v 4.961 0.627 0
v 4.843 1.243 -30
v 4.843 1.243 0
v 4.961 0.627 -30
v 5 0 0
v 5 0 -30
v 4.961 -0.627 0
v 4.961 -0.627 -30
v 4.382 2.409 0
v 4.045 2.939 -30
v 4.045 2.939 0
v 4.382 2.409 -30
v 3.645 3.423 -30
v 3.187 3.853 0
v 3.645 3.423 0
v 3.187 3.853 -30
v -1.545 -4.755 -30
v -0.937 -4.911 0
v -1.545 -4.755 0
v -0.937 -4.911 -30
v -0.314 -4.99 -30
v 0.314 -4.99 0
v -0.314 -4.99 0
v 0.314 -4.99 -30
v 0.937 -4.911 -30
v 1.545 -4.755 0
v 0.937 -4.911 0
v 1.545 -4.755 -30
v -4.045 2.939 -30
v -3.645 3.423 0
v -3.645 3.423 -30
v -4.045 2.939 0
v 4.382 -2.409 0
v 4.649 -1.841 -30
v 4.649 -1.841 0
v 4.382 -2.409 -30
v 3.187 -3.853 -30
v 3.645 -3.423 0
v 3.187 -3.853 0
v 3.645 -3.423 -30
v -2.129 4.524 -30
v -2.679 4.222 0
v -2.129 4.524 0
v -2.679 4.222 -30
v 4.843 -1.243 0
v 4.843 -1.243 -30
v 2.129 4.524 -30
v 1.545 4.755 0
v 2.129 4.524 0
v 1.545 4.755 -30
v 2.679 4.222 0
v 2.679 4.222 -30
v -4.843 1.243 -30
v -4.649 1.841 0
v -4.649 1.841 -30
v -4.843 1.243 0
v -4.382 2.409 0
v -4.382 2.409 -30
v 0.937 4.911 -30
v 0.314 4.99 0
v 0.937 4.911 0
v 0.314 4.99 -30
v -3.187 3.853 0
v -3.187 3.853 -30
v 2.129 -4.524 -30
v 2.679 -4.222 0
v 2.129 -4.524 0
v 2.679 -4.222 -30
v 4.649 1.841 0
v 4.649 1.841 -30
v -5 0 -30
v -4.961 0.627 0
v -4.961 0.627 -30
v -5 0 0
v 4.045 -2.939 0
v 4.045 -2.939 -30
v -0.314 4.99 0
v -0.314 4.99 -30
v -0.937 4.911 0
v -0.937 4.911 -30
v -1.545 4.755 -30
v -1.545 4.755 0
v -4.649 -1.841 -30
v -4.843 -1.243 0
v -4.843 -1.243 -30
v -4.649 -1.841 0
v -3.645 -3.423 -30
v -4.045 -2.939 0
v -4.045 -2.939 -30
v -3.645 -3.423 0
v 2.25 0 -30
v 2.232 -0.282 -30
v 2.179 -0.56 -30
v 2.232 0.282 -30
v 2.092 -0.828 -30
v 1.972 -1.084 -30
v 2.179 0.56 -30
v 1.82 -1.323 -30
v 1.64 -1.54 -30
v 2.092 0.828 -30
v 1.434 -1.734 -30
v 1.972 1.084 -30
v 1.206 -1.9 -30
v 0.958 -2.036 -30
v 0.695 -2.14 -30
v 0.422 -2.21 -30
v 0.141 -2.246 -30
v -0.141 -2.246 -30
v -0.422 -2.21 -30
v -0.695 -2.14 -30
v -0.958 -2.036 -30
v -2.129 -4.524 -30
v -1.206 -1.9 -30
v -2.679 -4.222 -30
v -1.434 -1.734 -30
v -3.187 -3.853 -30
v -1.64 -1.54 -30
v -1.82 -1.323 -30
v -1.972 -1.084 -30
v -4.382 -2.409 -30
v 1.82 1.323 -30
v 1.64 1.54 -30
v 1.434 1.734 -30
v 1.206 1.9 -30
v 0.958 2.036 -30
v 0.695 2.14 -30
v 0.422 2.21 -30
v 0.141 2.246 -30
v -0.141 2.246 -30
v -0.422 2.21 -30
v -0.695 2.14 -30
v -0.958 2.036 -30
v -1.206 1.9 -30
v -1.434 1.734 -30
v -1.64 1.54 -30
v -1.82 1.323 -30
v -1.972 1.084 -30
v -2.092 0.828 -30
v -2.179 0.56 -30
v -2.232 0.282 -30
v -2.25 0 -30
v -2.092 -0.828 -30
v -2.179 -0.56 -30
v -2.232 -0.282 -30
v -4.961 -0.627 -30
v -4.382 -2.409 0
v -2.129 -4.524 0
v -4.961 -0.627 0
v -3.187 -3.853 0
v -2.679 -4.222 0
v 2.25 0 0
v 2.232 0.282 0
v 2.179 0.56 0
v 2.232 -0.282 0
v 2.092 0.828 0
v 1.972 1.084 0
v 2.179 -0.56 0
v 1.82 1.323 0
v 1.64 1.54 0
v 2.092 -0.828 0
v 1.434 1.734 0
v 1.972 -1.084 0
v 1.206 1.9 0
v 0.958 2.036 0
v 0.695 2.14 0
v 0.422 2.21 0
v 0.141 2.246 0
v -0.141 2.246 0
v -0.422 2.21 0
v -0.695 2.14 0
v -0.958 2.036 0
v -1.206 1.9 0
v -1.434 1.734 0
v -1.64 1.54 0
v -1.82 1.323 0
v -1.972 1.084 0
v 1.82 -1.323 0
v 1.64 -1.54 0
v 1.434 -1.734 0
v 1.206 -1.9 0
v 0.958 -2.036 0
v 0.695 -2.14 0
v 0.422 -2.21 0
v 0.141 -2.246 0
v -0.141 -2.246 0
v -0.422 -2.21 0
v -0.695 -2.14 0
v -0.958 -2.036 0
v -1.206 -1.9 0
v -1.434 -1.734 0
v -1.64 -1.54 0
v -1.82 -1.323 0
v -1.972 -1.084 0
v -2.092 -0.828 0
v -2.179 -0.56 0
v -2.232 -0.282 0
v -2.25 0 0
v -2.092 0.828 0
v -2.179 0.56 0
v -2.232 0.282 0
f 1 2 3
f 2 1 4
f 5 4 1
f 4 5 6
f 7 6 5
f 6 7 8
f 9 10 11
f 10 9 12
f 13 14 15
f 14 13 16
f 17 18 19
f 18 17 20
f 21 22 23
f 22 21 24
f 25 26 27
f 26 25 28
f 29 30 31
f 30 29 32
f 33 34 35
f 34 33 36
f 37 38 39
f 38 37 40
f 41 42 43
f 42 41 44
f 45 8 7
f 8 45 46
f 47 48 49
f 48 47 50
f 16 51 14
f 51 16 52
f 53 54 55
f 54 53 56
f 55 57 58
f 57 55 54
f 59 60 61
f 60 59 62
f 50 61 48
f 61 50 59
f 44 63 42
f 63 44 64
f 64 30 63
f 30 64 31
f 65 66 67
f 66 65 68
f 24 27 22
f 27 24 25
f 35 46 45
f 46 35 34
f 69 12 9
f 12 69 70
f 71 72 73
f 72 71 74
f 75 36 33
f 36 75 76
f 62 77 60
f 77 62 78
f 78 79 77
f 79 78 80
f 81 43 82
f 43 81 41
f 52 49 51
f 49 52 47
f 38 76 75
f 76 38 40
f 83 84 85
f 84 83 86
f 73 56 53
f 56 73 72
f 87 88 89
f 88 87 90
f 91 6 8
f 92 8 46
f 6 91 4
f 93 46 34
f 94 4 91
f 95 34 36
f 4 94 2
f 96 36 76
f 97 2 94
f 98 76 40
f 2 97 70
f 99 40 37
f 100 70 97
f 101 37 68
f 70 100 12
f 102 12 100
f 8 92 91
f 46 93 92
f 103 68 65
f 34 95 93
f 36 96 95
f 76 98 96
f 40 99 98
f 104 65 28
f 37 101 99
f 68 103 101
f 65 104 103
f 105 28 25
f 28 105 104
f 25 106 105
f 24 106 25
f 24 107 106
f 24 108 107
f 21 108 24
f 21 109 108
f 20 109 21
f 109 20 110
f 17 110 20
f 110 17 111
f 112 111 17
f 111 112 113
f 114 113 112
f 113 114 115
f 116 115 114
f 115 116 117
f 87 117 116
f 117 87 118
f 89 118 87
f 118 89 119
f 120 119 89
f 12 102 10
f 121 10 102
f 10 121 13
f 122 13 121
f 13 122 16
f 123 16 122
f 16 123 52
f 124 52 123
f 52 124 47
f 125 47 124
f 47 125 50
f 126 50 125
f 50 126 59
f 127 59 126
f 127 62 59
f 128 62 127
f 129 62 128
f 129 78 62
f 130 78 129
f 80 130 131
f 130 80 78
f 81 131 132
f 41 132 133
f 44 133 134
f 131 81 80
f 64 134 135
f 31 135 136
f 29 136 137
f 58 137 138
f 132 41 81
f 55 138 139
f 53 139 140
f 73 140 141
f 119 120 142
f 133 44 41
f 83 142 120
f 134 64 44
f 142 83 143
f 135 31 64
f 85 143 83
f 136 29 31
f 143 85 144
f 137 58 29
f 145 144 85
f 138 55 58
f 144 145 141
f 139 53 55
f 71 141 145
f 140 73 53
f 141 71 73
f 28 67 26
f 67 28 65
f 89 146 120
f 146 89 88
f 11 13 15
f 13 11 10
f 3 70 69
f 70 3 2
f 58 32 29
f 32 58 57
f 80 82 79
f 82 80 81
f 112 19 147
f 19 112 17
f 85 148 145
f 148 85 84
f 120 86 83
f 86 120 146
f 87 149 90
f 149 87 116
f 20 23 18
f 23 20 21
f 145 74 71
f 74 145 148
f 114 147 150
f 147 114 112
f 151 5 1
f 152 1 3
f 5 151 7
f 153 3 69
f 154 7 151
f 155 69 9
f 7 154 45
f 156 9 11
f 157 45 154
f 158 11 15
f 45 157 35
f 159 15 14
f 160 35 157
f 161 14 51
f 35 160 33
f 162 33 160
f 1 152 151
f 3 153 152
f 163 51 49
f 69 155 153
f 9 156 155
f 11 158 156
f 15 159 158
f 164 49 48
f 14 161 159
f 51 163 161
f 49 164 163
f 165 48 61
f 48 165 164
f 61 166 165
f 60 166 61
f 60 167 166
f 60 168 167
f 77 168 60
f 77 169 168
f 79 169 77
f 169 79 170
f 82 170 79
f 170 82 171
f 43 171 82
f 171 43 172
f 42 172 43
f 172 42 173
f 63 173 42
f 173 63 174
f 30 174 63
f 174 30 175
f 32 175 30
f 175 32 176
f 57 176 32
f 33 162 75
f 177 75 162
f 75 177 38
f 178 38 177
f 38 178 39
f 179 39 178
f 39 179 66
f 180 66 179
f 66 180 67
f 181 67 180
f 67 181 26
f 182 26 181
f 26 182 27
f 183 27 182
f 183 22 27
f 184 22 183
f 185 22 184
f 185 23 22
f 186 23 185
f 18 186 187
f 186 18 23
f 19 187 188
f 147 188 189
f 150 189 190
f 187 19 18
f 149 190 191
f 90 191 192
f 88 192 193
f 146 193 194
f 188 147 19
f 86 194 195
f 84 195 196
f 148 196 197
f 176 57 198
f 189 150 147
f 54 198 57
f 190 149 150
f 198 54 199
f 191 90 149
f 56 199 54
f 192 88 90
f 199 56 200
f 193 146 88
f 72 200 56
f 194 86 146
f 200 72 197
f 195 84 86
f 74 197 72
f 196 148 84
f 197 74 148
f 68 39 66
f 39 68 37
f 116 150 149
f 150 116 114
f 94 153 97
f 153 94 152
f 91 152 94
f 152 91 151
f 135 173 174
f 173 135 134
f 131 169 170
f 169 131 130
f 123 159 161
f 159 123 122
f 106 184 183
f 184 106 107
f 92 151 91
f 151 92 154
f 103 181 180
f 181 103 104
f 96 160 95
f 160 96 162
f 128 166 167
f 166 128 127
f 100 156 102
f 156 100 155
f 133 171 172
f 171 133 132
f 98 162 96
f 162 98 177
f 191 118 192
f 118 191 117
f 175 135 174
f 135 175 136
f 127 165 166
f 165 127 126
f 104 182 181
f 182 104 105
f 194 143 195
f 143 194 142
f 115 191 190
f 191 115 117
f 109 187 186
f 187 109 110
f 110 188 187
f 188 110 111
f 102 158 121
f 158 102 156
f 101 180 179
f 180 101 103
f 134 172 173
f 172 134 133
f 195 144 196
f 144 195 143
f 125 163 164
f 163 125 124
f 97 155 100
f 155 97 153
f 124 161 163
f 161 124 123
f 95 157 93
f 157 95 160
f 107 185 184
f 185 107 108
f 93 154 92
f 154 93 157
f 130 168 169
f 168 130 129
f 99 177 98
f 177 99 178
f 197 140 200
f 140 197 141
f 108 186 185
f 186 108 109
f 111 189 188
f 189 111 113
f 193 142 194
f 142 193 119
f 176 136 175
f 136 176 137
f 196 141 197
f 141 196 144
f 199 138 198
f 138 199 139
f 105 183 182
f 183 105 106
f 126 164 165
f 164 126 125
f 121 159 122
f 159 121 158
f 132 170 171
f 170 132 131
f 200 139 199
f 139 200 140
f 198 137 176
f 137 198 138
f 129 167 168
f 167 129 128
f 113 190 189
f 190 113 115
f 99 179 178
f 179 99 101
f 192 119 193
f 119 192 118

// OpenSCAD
$fn = 50;


difference() {
	union() {
		translate(v = [0, 0, -30.0000000000]) {
			cylinder(h = 30, r = 5.0000000000);
		}
		cylinder(h = 0, r = 8.0000000000);
	}
	union() {
		#translate(v = [0, 0, -30]) {
			cylinder(h = 30, r = 2.2500000000);
		}
	}
}
